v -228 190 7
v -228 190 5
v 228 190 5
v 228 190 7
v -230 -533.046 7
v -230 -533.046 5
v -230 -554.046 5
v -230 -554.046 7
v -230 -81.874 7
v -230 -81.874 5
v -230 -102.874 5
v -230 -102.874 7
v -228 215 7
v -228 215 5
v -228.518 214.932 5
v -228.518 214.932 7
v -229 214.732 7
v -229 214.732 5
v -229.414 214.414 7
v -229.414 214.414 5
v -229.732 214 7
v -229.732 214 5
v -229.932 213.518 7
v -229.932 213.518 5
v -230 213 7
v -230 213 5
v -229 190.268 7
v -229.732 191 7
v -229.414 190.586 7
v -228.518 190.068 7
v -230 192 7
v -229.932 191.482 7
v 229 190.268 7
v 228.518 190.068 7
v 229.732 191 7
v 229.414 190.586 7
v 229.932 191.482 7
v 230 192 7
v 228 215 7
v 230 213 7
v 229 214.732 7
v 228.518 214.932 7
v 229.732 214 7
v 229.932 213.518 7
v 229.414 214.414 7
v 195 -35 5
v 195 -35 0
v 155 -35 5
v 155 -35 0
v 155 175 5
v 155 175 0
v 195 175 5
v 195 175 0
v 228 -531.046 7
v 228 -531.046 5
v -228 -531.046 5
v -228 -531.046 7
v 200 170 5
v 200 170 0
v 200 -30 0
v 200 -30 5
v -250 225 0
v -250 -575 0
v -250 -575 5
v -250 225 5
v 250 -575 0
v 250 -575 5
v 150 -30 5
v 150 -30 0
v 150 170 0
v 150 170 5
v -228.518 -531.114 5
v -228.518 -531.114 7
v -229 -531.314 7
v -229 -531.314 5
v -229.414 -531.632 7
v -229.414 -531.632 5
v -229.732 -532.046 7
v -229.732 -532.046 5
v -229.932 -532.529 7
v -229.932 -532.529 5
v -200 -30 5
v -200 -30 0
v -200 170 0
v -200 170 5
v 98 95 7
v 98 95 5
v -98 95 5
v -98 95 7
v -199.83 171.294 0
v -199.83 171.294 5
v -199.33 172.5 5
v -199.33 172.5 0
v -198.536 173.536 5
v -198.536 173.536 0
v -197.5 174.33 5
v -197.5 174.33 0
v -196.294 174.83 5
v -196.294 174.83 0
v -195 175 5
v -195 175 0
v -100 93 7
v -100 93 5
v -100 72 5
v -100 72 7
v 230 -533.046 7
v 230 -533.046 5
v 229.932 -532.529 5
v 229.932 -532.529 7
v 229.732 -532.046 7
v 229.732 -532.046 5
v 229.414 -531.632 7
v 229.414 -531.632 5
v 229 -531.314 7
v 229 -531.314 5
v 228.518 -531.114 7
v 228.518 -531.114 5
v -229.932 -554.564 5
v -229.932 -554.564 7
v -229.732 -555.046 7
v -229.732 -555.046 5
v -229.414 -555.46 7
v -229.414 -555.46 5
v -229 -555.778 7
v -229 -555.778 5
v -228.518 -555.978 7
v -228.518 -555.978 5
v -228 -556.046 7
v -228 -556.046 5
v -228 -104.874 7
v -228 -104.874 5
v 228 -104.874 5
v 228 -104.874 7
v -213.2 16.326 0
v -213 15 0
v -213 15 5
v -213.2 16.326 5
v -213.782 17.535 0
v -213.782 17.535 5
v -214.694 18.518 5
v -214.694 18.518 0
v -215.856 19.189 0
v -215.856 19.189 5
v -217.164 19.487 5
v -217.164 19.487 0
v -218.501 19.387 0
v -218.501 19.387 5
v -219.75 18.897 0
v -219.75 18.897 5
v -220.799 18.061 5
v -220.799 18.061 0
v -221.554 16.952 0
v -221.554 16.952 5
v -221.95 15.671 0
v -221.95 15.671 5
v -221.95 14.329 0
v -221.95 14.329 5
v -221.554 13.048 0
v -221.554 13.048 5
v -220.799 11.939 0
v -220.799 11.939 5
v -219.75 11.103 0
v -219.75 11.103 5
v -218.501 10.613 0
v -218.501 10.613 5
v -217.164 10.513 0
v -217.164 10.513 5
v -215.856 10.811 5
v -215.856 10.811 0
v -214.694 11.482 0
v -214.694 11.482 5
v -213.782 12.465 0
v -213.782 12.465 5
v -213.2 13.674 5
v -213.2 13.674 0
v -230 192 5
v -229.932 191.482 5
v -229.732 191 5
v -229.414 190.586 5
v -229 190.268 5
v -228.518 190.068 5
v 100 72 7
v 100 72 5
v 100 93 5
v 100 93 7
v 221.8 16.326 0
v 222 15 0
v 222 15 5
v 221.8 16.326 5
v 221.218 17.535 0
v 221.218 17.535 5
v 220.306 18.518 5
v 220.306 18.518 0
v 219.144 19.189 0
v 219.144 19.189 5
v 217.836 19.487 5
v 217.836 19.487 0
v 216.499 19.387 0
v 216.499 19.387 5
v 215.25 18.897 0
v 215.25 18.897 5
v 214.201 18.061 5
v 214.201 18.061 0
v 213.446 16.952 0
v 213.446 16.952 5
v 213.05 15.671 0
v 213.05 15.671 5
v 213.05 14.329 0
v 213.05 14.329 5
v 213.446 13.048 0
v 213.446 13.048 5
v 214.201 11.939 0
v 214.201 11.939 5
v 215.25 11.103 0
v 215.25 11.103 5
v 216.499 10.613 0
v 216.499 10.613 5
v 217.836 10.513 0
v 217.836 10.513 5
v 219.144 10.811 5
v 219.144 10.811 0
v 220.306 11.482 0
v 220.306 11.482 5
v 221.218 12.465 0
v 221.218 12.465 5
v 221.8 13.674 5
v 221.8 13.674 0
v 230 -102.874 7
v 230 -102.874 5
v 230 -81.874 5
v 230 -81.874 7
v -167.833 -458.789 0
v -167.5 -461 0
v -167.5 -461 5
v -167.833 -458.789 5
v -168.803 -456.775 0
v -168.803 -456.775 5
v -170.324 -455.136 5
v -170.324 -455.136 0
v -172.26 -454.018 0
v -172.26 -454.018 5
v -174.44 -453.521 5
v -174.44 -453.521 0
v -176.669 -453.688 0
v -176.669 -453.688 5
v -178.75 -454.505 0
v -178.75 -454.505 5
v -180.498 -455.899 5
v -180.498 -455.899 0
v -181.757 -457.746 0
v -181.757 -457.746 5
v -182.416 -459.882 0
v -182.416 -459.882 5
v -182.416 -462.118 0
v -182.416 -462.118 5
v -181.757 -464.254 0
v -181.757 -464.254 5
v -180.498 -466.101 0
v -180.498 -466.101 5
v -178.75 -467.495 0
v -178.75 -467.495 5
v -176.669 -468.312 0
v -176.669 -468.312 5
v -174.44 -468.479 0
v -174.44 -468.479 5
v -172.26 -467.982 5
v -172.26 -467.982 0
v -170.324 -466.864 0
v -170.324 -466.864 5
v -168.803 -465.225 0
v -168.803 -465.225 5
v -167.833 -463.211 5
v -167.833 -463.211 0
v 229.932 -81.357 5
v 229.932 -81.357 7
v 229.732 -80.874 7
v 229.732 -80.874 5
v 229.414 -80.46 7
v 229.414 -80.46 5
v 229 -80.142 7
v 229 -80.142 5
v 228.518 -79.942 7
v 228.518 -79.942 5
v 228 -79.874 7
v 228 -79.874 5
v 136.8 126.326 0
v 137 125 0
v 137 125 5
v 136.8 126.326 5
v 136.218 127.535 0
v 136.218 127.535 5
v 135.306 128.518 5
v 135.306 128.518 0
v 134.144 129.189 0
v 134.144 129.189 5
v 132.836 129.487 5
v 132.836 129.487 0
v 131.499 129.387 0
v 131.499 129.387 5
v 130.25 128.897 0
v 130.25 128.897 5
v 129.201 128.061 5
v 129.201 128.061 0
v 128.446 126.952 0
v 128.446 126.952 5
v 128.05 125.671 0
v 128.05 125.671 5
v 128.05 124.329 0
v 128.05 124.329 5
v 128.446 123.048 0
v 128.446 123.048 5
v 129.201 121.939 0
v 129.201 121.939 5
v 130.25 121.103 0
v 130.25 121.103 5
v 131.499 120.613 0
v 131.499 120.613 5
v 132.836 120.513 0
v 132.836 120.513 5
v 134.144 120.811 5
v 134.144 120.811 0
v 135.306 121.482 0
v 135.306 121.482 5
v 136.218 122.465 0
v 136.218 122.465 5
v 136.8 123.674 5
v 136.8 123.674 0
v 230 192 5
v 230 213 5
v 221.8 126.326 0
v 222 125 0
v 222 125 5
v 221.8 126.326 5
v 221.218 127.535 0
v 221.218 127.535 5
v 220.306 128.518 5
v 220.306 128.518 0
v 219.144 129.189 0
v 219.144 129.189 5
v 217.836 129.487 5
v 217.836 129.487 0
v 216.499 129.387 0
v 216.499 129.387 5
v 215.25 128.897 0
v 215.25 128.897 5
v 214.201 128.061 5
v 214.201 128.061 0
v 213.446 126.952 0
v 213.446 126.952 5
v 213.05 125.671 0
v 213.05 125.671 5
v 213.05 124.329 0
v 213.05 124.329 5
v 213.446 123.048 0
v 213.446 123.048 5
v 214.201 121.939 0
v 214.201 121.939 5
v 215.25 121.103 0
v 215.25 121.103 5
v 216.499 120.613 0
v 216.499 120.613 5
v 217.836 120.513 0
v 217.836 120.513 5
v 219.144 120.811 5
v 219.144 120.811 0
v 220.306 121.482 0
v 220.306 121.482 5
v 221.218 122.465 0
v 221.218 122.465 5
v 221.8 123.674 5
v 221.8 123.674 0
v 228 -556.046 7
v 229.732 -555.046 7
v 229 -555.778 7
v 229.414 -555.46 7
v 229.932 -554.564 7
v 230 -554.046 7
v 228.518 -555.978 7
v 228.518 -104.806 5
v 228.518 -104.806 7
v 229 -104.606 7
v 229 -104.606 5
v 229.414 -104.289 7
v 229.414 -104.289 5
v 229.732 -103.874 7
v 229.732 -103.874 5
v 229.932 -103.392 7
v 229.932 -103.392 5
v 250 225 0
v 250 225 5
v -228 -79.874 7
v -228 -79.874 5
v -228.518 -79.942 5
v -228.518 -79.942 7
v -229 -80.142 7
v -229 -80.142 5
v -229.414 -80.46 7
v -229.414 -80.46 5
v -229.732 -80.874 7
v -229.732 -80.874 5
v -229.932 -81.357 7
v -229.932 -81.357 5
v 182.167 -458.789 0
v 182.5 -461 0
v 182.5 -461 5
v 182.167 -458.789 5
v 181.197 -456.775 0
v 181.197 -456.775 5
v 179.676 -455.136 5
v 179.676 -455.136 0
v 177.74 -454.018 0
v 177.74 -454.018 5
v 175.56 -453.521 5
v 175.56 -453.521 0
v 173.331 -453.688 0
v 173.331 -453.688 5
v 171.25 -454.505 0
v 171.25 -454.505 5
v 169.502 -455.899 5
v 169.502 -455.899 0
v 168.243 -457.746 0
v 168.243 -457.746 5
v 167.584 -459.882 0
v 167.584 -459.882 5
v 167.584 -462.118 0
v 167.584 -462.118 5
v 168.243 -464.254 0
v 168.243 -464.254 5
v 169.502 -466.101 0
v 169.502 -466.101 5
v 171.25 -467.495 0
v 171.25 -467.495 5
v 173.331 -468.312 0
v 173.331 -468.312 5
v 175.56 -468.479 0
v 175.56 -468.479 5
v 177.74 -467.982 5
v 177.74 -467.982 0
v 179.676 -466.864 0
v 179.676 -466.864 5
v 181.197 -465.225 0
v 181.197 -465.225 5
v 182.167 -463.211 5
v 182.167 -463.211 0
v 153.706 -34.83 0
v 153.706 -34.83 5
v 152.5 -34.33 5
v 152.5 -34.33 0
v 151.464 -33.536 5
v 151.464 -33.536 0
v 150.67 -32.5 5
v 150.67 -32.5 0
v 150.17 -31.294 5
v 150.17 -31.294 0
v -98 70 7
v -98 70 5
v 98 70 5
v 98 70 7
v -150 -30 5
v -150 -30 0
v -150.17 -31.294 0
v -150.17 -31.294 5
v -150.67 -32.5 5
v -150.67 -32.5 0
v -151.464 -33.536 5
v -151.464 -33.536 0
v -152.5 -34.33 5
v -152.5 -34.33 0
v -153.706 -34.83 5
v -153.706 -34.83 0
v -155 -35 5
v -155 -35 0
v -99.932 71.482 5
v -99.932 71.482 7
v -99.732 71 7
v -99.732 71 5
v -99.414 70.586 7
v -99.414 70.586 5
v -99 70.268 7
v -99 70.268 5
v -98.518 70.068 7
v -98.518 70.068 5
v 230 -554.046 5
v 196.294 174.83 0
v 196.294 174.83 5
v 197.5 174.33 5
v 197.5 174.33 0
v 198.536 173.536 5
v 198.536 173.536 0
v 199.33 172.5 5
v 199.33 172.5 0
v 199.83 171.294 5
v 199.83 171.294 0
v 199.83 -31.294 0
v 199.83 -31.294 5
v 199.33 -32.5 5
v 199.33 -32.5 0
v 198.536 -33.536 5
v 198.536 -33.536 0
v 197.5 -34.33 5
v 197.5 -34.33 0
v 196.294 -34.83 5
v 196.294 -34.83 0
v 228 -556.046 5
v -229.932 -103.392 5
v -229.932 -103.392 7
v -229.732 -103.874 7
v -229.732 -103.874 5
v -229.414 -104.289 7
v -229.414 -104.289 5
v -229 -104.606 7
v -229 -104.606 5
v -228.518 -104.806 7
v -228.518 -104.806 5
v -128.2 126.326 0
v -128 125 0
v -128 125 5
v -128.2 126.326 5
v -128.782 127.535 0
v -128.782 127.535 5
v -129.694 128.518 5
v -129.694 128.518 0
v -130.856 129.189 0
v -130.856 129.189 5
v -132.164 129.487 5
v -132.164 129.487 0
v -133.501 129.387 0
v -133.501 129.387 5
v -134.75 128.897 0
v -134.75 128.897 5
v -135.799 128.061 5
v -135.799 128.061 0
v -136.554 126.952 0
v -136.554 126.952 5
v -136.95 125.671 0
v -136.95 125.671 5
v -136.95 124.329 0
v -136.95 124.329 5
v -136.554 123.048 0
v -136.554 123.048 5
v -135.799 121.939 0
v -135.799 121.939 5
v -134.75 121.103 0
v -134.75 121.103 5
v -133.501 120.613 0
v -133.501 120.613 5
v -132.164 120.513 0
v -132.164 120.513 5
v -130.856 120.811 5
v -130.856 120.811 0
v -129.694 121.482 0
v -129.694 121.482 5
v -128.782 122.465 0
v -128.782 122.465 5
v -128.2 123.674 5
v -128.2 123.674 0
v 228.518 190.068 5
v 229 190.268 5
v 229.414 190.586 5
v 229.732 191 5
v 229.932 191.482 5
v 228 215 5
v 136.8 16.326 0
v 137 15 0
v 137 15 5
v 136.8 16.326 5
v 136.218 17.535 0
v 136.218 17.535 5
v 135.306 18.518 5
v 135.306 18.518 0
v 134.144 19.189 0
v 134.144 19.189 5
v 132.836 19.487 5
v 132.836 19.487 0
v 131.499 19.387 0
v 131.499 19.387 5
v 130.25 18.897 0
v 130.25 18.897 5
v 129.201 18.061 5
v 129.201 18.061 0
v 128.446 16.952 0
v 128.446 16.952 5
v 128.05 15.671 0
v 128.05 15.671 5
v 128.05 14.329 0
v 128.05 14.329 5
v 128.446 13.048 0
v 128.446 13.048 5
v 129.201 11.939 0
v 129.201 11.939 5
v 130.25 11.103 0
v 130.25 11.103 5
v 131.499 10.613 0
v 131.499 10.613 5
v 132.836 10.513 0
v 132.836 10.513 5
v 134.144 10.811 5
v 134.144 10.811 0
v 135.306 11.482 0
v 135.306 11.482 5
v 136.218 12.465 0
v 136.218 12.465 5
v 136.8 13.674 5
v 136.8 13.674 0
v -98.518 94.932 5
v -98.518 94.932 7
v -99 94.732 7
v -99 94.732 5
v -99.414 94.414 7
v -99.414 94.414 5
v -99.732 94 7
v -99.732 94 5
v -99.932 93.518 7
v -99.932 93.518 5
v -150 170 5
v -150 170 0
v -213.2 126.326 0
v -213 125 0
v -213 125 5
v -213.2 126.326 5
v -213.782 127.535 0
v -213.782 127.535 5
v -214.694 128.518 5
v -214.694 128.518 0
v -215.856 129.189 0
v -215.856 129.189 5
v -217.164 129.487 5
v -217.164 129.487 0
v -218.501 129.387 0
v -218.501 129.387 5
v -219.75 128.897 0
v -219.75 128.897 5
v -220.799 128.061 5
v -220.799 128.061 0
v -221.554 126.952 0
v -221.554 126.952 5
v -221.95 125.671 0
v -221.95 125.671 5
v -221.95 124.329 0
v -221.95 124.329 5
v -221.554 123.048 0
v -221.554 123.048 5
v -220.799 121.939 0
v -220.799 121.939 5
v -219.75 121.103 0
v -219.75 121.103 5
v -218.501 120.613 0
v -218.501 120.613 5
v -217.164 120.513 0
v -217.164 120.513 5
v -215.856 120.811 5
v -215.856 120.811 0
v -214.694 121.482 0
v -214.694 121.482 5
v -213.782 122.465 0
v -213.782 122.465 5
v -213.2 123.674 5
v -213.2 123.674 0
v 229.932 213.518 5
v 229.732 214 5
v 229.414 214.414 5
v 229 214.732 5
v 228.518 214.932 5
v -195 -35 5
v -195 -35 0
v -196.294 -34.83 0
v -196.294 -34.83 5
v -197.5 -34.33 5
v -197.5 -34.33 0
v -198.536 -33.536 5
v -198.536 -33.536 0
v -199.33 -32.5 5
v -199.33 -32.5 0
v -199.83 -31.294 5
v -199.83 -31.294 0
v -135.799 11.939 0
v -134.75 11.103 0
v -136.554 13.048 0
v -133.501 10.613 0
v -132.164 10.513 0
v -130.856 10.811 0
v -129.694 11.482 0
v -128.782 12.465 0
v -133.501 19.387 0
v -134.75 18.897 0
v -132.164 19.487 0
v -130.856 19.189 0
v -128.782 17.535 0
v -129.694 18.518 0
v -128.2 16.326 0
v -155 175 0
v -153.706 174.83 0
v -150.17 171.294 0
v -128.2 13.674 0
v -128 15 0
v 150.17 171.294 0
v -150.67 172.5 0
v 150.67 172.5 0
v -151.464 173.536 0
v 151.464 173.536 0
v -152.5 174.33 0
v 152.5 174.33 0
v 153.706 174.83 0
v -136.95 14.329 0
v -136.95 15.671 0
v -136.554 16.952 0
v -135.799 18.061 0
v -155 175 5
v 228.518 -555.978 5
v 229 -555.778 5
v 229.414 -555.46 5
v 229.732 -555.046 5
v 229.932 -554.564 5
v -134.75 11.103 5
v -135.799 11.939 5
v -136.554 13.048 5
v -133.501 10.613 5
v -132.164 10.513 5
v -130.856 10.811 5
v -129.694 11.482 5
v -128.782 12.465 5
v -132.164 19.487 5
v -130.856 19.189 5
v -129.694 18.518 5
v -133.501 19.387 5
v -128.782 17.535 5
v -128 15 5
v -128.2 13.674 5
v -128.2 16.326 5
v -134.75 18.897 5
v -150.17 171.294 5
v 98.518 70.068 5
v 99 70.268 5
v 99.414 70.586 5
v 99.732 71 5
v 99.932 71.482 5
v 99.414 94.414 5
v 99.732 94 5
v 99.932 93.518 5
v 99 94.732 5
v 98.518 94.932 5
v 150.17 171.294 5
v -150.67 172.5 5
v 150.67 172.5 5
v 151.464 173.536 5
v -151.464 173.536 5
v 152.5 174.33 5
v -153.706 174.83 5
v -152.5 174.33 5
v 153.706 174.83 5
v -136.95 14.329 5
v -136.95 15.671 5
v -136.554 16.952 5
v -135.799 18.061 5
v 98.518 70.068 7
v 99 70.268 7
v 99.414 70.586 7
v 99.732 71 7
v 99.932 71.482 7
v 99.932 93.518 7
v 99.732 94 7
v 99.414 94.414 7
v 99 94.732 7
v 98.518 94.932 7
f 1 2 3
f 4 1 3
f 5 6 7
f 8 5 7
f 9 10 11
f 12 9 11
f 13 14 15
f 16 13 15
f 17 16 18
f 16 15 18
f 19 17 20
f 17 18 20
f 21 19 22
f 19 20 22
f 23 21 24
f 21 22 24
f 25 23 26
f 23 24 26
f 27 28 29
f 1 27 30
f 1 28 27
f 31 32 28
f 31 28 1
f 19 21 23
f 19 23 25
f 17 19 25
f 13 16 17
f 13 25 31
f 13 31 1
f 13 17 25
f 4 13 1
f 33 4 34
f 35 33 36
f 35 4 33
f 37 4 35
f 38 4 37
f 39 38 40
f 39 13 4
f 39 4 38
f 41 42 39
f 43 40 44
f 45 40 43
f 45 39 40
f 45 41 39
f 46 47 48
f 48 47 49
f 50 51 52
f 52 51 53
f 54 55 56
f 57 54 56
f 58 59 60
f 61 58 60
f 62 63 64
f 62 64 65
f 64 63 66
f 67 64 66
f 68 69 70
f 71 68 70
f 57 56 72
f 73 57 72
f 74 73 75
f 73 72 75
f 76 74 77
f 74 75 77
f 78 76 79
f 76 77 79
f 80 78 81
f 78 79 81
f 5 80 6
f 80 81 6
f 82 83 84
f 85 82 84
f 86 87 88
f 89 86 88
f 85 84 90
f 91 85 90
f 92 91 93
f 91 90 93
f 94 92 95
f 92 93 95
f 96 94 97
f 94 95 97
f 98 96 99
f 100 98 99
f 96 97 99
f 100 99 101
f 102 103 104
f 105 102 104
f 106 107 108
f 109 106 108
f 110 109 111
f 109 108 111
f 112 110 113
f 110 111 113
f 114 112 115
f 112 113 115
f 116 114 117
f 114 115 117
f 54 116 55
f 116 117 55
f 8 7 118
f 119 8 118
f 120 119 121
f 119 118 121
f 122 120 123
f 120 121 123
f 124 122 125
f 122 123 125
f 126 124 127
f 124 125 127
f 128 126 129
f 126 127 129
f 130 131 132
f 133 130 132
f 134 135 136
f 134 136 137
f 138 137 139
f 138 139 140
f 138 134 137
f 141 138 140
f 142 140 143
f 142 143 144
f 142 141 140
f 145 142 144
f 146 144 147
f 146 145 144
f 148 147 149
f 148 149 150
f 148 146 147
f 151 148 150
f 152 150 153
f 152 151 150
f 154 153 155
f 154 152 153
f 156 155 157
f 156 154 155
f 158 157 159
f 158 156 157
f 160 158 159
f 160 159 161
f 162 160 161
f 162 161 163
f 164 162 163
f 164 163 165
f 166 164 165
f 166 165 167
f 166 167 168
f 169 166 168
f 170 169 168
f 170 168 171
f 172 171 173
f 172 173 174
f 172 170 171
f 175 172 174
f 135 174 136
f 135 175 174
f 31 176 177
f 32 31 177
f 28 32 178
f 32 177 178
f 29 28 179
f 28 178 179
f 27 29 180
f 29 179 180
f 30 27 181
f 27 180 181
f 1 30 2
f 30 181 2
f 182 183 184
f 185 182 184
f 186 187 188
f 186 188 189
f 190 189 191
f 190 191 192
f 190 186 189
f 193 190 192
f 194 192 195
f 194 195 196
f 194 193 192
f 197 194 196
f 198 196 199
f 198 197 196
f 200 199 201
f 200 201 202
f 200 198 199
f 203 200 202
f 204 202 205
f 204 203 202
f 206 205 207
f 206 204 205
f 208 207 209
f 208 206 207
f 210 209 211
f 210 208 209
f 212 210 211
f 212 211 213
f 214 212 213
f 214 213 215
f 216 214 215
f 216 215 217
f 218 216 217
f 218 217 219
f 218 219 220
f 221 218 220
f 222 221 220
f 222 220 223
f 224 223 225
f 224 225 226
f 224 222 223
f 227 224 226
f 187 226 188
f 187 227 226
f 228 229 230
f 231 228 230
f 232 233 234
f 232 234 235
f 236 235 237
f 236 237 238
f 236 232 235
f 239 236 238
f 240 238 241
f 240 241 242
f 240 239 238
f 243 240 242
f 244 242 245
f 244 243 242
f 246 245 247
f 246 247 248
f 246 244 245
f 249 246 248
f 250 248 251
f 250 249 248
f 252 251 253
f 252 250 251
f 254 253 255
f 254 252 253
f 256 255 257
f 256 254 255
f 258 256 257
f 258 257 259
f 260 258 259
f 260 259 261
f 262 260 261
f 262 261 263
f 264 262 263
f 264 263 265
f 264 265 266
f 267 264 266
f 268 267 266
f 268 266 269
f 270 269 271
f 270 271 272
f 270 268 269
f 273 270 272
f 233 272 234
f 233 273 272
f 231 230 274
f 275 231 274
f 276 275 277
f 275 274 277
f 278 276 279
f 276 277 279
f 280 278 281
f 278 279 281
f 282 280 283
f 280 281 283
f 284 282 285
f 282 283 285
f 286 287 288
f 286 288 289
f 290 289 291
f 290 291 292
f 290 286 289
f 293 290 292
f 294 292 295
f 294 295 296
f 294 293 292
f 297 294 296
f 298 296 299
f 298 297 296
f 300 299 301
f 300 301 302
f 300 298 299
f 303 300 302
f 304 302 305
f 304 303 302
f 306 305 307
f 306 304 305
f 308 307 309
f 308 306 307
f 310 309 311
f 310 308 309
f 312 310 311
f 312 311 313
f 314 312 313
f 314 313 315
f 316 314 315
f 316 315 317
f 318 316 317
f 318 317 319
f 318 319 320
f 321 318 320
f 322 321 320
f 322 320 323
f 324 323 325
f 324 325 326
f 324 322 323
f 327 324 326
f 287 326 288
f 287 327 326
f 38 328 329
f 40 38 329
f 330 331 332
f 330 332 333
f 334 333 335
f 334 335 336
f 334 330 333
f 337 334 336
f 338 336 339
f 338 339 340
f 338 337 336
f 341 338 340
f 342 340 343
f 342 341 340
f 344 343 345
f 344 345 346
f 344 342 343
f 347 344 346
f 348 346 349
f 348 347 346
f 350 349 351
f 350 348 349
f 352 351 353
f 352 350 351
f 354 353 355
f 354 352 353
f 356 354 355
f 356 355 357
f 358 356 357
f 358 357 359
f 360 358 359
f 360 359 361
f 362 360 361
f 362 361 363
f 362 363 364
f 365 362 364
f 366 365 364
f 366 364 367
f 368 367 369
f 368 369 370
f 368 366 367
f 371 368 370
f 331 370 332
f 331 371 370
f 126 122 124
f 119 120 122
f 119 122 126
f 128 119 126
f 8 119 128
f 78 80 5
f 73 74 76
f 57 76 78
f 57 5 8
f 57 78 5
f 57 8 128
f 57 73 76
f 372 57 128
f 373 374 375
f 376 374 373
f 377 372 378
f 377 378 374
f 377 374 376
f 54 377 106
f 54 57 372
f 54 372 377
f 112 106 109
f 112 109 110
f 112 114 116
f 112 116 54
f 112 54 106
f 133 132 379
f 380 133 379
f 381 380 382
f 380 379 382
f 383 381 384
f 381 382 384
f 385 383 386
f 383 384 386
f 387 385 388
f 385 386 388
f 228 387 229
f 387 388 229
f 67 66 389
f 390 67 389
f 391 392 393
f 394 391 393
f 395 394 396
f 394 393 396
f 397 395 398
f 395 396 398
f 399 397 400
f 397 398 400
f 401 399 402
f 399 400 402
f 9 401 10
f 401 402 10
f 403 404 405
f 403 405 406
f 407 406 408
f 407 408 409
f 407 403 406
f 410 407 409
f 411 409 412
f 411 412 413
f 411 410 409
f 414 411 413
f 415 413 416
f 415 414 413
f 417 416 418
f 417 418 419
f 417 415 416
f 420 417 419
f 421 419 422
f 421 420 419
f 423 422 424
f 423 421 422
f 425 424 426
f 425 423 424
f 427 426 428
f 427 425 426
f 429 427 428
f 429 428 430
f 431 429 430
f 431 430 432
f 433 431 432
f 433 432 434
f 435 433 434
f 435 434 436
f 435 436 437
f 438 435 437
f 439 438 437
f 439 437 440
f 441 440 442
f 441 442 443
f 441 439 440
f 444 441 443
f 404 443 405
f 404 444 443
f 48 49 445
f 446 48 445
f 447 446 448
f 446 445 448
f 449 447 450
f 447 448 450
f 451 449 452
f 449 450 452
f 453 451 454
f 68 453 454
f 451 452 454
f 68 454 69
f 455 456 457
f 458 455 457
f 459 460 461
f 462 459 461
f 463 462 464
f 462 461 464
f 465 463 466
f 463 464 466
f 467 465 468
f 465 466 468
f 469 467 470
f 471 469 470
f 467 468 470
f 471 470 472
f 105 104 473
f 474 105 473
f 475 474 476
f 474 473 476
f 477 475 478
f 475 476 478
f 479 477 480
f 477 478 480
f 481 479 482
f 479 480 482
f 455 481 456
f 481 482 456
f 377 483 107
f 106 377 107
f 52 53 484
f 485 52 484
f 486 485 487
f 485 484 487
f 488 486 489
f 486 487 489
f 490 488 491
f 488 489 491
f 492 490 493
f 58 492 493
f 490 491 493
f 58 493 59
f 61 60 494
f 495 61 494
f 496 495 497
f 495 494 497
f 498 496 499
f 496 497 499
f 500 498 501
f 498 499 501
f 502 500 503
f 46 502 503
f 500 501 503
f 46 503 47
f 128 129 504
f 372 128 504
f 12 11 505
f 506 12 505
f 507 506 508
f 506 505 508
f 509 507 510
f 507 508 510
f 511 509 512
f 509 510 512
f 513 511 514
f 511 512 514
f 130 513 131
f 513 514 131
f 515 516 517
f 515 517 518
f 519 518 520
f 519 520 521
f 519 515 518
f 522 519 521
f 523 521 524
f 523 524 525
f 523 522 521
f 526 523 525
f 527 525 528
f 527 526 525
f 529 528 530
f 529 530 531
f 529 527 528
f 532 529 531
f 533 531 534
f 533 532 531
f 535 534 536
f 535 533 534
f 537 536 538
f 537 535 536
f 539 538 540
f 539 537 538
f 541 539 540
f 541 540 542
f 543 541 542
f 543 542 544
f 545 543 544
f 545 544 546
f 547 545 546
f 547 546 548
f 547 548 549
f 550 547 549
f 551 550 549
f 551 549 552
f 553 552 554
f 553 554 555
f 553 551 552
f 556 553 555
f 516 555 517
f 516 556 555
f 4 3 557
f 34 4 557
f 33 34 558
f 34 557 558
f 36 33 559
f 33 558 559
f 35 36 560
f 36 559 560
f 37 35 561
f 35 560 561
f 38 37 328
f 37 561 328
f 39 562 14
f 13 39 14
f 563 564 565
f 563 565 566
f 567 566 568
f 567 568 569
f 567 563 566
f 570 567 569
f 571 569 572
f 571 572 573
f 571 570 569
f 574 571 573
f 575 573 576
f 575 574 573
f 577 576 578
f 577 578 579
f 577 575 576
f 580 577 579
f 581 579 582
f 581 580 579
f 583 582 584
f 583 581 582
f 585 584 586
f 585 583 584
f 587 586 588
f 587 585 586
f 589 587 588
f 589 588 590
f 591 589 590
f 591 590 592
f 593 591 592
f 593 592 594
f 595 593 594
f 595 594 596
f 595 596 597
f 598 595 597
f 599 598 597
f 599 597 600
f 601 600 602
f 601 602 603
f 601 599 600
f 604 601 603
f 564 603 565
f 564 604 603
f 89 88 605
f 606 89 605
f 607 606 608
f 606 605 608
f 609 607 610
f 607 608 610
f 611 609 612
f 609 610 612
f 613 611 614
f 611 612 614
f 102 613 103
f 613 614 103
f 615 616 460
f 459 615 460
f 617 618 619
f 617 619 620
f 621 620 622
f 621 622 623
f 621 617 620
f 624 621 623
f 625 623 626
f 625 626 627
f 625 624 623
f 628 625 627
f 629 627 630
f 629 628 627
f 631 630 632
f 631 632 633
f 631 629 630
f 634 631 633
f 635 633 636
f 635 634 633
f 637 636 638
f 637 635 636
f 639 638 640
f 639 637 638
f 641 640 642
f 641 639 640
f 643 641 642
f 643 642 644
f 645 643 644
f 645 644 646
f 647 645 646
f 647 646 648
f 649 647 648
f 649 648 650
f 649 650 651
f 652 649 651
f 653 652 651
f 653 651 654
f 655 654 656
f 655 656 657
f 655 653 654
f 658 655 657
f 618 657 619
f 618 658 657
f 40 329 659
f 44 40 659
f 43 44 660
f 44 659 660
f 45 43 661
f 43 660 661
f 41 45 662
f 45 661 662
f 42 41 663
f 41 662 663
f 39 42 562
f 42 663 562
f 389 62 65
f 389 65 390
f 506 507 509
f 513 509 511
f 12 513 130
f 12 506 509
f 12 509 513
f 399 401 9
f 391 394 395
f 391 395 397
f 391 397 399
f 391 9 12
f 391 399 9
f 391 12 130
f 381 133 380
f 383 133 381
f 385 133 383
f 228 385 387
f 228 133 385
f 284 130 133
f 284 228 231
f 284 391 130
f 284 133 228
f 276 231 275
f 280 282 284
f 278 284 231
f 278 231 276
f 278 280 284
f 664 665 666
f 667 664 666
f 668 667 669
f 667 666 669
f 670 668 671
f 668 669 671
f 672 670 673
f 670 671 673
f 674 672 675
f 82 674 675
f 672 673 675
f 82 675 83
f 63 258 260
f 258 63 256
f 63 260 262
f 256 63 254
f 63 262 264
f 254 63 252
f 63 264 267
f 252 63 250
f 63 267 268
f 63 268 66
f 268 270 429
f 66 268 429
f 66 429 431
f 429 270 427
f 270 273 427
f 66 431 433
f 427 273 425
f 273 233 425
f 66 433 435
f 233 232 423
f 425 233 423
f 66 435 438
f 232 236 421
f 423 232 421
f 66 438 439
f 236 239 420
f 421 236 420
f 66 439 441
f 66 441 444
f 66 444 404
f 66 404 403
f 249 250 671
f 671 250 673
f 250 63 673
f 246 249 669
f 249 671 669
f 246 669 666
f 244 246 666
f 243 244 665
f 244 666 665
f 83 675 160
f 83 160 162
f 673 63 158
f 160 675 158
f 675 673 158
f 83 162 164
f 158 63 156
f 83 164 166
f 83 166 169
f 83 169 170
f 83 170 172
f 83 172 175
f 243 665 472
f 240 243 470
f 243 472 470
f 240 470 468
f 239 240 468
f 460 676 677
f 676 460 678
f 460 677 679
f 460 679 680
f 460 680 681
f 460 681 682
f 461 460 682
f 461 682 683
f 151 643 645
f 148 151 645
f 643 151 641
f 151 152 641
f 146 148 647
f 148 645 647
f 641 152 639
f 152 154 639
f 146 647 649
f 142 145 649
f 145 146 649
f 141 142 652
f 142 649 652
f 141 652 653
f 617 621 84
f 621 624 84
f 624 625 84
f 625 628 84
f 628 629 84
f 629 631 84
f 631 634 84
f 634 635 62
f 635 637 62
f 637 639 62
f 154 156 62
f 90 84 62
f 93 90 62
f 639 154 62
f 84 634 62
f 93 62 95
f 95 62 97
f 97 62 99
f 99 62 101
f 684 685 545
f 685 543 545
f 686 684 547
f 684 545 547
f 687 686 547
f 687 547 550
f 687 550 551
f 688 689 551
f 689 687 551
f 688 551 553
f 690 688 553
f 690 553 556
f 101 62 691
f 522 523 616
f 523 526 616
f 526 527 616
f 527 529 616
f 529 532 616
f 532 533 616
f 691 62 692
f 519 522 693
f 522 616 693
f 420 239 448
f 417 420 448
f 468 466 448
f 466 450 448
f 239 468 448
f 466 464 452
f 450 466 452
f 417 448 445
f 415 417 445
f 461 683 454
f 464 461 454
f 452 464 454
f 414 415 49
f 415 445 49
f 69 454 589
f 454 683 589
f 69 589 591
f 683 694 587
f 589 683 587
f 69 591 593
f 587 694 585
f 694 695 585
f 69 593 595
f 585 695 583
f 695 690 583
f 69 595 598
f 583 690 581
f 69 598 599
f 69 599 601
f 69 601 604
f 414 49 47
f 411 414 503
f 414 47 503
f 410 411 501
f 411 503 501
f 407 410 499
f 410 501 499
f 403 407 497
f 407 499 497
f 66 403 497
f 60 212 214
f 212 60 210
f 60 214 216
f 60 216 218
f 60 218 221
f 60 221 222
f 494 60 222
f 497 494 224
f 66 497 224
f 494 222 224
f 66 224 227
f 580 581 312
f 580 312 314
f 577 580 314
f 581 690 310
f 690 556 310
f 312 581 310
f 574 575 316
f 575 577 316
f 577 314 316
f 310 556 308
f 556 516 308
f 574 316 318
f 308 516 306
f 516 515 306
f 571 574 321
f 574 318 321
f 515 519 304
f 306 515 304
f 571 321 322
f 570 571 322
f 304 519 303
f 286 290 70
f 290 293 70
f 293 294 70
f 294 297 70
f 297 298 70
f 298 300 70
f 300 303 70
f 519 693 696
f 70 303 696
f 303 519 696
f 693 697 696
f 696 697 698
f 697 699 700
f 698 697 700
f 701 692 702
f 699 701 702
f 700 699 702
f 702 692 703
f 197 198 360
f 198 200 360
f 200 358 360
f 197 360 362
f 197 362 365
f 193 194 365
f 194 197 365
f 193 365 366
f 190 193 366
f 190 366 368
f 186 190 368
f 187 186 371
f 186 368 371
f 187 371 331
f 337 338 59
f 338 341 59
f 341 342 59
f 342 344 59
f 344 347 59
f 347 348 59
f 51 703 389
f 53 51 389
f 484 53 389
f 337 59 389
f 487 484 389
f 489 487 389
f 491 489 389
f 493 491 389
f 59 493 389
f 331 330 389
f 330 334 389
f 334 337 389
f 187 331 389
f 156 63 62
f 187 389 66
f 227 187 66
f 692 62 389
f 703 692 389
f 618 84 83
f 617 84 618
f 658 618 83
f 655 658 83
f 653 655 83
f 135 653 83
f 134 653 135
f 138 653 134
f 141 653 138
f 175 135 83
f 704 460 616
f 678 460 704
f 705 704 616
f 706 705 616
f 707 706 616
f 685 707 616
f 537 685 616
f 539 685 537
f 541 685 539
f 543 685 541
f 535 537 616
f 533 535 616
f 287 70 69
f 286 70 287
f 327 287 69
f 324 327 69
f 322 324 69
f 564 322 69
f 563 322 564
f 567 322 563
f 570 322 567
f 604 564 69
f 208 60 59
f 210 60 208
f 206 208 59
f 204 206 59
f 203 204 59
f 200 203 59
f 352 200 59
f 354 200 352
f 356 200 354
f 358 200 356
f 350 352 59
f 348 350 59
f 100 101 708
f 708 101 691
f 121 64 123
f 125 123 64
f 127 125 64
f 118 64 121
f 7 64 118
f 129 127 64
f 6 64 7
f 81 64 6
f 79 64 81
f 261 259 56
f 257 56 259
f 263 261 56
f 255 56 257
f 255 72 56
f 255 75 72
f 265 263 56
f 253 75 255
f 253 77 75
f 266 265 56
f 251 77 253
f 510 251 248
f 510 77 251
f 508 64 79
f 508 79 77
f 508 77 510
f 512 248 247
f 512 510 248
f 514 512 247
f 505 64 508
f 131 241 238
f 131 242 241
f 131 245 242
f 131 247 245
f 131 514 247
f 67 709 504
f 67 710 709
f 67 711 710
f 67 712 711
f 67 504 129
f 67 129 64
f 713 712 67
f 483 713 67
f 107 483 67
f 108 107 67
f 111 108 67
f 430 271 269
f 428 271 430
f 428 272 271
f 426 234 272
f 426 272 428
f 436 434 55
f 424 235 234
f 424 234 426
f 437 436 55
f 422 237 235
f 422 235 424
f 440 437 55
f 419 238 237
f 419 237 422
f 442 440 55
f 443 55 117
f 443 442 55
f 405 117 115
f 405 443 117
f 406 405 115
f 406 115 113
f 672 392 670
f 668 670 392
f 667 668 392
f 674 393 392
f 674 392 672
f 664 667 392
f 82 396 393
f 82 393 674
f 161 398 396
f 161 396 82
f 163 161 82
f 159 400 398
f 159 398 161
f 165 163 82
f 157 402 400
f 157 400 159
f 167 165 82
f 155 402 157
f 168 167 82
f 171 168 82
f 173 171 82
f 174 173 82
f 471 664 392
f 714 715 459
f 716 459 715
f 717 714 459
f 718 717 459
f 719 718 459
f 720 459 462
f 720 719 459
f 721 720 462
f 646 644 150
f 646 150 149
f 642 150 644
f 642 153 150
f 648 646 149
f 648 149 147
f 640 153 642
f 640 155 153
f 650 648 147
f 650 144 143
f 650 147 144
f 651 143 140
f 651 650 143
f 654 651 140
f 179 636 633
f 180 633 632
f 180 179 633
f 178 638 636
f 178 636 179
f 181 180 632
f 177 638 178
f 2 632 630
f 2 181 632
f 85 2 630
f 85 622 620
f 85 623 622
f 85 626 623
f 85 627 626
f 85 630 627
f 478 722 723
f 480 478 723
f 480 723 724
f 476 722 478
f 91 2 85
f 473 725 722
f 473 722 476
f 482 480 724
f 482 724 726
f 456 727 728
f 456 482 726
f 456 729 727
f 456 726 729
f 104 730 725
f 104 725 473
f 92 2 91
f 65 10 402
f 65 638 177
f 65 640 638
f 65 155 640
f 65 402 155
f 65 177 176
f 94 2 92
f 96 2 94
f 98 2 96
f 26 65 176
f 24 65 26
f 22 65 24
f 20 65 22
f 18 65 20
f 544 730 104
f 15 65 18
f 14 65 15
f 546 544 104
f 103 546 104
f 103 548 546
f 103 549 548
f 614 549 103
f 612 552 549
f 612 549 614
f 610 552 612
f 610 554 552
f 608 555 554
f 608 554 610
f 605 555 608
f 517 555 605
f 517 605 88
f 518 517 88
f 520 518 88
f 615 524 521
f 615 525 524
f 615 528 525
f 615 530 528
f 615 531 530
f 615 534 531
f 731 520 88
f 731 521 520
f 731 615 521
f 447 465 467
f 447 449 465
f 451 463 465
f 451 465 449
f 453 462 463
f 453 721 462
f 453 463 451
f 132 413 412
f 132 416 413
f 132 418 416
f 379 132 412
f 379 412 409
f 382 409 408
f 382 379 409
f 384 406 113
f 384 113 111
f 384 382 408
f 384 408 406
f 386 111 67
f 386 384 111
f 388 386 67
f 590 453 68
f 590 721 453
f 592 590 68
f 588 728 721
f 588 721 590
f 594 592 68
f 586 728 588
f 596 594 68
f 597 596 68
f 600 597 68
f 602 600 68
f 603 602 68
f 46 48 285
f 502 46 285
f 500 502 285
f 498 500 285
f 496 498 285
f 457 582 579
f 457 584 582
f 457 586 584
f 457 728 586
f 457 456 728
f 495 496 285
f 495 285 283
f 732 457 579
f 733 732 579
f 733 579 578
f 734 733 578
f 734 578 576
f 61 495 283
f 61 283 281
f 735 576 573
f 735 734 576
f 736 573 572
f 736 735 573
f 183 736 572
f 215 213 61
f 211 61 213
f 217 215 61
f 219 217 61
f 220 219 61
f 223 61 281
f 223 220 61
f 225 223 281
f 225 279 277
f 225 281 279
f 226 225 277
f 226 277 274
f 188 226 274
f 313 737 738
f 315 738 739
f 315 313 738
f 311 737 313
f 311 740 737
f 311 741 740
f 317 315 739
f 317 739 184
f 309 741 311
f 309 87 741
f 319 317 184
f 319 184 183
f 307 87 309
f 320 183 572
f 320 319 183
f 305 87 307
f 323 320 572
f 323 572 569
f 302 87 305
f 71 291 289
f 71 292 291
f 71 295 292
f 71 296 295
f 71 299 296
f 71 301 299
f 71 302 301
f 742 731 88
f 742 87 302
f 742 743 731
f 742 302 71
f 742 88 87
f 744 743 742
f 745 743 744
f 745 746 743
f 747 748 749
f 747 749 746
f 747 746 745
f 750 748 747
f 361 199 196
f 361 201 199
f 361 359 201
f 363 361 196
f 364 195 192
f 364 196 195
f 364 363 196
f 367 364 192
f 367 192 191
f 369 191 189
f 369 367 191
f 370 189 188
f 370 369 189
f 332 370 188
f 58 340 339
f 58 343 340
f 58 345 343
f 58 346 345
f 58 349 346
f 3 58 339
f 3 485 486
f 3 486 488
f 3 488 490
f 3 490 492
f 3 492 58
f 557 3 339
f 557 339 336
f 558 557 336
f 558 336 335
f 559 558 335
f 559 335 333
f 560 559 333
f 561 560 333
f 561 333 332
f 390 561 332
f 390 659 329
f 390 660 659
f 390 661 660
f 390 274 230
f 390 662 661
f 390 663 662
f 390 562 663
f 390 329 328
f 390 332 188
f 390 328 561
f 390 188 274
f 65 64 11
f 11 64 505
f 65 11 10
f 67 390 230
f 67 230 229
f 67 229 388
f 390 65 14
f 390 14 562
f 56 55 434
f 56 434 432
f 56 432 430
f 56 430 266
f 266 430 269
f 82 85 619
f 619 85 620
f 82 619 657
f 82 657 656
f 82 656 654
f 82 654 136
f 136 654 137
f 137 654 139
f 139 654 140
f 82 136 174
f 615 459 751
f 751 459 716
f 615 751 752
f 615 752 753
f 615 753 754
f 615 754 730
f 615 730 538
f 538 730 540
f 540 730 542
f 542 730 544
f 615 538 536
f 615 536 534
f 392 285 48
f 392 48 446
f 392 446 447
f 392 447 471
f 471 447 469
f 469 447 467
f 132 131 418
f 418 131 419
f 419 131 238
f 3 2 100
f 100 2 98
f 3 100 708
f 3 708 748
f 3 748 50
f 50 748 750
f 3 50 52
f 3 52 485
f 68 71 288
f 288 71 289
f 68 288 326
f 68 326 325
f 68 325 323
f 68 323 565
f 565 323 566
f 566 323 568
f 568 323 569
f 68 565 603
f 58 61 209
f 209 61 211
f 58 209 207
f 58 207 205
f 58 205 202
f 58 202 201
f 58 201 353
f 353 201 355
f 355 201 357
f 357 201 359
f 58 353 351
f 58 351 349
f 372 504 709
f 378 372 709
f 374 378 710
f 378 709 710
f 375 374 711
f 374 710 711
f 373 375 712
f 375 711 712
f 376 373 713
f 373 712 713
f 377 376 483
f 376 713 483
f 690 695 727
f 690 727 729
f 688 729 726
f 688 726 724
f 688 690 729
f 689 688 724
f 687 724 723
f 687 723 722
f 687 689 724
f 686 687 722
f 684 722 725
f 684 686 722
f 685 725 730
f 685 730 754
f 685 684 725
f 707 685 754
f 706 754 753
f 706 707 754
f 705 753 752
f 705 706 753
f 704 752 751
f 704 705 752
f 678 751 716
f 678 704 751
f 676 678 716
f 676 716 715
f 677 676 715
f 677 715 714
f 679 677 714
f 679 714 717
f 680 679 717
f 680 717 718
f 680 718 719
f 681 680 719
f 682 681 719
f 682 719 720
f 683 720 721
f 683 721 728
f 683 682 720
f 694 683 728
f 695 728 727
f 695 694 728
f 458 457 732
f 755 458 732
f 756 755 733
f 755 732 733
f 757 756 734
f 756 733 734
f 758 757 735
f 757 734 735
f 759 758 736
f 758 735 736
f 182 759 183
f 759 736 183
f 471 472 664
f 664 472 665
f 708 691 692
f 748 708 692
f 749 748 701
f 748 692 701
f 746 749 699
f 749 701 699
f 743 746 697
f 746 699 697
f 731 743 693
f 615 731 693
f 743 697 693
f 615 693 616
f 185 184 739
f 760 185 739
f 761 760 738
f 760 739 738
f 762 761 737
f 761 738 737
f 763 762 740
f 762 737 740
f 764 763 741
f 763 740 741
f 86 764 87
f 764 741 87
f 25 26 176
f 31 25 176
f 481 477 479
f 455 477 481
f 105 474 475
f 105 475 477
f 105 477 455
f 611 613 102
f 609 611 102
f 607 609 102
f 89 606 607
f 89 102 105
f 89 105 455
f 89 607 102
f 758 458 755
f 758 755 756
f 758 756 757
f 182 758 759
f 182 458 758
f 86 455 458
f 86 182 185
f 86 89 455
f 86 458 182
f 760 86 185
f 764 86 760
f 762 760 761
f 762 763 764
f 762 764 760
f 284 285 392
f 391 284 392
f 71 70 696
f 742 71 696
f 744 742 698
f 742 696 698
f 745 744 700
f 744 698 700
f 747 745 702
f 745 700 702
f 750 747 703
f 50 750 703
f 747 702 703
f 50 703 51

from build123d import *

# Parameters (mm, degrees)
F0_W     = 500
F0_H     = 800
F0_R     = 7.5
F0_R_2   = 4.5
F1_DEPTH = 5
F3_DEPTH = 2


with BuildPart() as f1:
    # F0 (on Top) → F1 (new body)
    with BuildSketch(Plane.XY):
        with Locations((0, -175)):
            Rectangle(F0_W, F0_H)
        with Locations((-175, -461)):
            Circle(F0_R, mode=Mode.SUBTRACT)
        with Locations((175, -461)):
            Circle(F0_R, mode=Mode.SUBTRACT)
        with Locations((-217.5, 15)):
            Circle(F0_R_2, mode=Mode.SUBTRACT)
        with Locations((-132.5, 15)):
            Circle(F0_R_2, mode=Mode.SUBTRACT)
        with BuildLine():
            ThreePointArc((-200, 170), (-198.535534, 173.535534), (-195, 175))
            Line((-195, 175), (-155, 175))
            ThreePointArc((-155, 175), (-151.464466, 173.535534), (-150, 170))
            Line((-150, 170), (-150, -30))
            ThreePointArc((-150, -30), (-151.464466, -33.535534), (-155, -35))
            Line((-155, -35), (-195, -35))
            ThreePointArc((-195, -35), (-198.535534, -33.535534), (-200, -30))
            Line((-200, -30), (-200, 170))
        make_face(mode=Mode.SUBTRACT)
        with Locations((-217.5, 125)):
            Circle(F0_R_2, mode=Mode.SUBTRACT)
        with Locations((-132.5, 125)):
            Circle(F0_R_2, mode=Mode.SUBTRACT)
        with Locations((132.5, 15)):
            Circle(F0_R_2, mode=Mode.SUBTRACT)
        with Locations((217.5, 15)):
            Circle(F0_R_2, mode=Mode.SUBTRACT)
        with BuildLine():
            Line((195, -35), (155, -35))
            ThreePointArc((155, -35), (151.464466, -33.535534), (150, -30))
            Line((150, -30), (150, 170))
            ThreePointArc((150, 170), (151.464466, 173.535534), (155, 175))
            Line((155, 175), (195, 175))
            ThreePointArc((195, 175), (198.535534, 173.535534), (200, 170))
            Line((200, 170), (200, -30))
            ThreePointArc((200, -30), (198.535534, -33.535534), (195, -35))
        make_face(mode=Mode.SUBTRACT)
        with Locations((132.5, 125)):
            Circle(F0_R_2, mode=Mode.SUBTRACT)
        with Locations((217.5, 125)):
            Circle(F0_R_2, mode=Mode.SUBTRACT)
    extrude(amount=F1_DEPTH)

    # F2 (on face) → F3 (join)
    with BuildSketch(Plane.XY.offset(5)):
        with BuildLine():
            Line((228, 215), (-228, 215))
            ThreePointArc((-228, 215), (-229.414214, 214.414214), (-230, 213))
            Line((-230, 213), (-230, 192))
            ThreePointArc((-230, 192), (-229.414214, 190.585786), (-228, 190))
            Line((-228, 190), (228, 190))
            ThreePointArc((228, 190), (229.414214, 190.585786), (230, 192))
            Line((230, 192), (230, 213))
            ThreePointArc((230, 213), (229.414214, 214.414214), (228, 215))
        make_face()
        with BuildLine():
            Line((98, 95), (-98, 95))
            ThreePointArc((-98, 95), (-99.414214, 94.414214), (-100, 93))
            Line((-100, 93), (-100, 72))
            ThreePointArc((-100, 72), (-99.414214, 70.585786), (-98, 70))
            Line((-98, 70), (98, 70))
            ThreePointArc((98, 70), (99.414214, 70.585786), (100, 72))
            Line((100, 72), (100, 93))
            ThreePointArc((100, 93), (99.414214, 94.414214), (98, 95))
        make_face()
        with BuildLine():
            Line((228, -79.874295), (-228, -79.874295))
            ThreePointArc((-228, -79.874295), (-229.414214, -80.460082), (-230, -81.874295))
            Line((-230, -81.874295), (-230, -102.874295))
            ThreePointArc((-230, -102.874295), (-229.414214, -104.288509), (-228, -104.874295))
            Line((-228, -104.874295), (228, -104.874295))
            ThreePointArc((228, -104.874295), (229.414214, -104.288509), (230, -102.874295))
            Line((230, -102.874295), (230, -81.874295))
            ThreePointArc((230, -81.874295), (229.414214, -80.460082), (228, -79.874295))
        make_face()
        with BuildLine():
            Line((228, -531.046275), (-228, -531.046275))
            ThreePointArc((-228, -531.046275), (-229.414214, -531.632061), (-230, -533.046275))
            Line((-230, -533.046275), (-230, -554.046275))
            ThreePointArc((-230, -554.046275), (-229.414214, -555.460488), (-228, -556.046275))
            Line((-228, -556.046275), (228, -556.046275))
            ThreePointArc((228, -556.046275), (229.414214, -555.460488), (230, -554.046275))
            Line((230, -554.046275), (230, -533.046275))
            ThreePointArc((230, -533.046275), (229.414214, -531.632061), (228, -531.046275))
        make_face()
    extrude(amount=F3_DEPTH)


solid = f1.part
